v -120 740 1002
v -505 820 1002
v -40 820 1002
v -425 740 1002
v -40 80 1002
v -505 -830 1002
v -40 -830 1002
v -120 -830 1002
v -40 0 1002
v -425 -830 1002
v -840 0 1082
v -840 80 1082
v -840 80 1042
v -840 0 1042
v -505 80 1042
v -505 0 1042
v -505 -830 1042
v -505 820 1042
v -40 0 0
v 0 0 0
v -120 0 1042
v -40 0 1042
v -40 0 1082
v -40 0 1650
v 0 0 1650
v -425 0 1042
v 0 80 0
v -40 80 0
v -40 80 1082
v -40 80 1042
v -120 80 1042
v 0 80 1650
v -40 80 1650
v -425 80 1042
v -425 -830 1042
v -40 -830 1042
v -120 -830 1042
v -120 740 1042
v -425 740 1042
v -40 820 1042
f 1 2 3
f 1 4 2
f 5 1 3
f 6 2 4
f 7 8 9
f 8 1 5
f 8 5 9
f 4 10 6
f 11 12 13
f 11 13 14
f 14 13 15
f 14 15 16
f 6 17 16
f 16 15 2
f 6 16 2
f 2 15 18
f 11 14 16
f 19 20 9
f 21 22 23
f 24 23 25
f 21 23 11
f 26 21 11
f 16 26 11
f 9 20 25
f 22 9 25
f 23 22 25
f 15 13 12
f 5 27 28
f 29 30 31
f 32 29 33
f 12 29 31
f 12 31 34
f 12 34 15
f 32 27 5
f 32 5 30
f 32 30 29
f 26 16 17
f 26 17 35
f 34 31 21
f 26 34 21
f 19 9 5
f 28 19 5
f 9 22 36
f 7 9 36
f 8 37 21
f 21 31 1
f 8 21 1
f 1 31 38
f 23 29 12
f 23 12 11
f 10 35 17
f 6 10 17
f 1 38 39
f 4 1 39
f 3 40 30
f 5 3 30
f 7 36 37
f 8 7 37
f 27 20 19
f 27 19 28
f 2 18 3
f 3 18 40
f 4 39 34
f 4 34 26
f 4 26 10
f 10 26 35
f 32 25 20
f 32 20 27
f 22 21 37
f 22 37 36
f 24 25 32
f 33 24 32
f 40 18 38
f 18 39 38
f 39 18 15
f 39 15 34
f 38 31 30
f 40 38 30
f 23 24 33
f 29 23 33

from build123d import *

# Parameters (mm, degrees)
F0_W     = 80
F0_H     = 1650
F1_DEPTH = 40
F2_W     = 80
F2_H     = 40
F3_DEPTH = 800
F5_DEPTH = 40


with BuildPart() as f1:
    # F0 (on Right) → F1 (new body)
    with BuildSketch(Plane.YZ):
        with Locations((40, 825)):
            Rectangle(F0_W, F0_H)
    extrude(amount=-F1_DEPTH)

    # F2 (on face) → F3 (join)
    with BuildSketch(Plane(origin=(-40, 0, 0), x_dir=(0, -1, 0), z_dir=(-1, 0, 0))):
        with Locations((-40, 1062)):
            Rectangle(F2_W, F2_H)
    extrude(amount=F3_DEPTH)

    # F4 (on face) → F5 (join)
    with BuildSketch(Plane(origin=(0, 0, 1042), x_dir=(1, 0, 0), z_dir=(0, 0, -1))):
        Polygon((-40, -820), (-40, 830), (-120, 830), (-120, -740), (-425, -740), (-425, 830), (-505, 830), (-505, -820), align=None)
    extrude(amount=F5_DEPTH)


solid = f1.part
